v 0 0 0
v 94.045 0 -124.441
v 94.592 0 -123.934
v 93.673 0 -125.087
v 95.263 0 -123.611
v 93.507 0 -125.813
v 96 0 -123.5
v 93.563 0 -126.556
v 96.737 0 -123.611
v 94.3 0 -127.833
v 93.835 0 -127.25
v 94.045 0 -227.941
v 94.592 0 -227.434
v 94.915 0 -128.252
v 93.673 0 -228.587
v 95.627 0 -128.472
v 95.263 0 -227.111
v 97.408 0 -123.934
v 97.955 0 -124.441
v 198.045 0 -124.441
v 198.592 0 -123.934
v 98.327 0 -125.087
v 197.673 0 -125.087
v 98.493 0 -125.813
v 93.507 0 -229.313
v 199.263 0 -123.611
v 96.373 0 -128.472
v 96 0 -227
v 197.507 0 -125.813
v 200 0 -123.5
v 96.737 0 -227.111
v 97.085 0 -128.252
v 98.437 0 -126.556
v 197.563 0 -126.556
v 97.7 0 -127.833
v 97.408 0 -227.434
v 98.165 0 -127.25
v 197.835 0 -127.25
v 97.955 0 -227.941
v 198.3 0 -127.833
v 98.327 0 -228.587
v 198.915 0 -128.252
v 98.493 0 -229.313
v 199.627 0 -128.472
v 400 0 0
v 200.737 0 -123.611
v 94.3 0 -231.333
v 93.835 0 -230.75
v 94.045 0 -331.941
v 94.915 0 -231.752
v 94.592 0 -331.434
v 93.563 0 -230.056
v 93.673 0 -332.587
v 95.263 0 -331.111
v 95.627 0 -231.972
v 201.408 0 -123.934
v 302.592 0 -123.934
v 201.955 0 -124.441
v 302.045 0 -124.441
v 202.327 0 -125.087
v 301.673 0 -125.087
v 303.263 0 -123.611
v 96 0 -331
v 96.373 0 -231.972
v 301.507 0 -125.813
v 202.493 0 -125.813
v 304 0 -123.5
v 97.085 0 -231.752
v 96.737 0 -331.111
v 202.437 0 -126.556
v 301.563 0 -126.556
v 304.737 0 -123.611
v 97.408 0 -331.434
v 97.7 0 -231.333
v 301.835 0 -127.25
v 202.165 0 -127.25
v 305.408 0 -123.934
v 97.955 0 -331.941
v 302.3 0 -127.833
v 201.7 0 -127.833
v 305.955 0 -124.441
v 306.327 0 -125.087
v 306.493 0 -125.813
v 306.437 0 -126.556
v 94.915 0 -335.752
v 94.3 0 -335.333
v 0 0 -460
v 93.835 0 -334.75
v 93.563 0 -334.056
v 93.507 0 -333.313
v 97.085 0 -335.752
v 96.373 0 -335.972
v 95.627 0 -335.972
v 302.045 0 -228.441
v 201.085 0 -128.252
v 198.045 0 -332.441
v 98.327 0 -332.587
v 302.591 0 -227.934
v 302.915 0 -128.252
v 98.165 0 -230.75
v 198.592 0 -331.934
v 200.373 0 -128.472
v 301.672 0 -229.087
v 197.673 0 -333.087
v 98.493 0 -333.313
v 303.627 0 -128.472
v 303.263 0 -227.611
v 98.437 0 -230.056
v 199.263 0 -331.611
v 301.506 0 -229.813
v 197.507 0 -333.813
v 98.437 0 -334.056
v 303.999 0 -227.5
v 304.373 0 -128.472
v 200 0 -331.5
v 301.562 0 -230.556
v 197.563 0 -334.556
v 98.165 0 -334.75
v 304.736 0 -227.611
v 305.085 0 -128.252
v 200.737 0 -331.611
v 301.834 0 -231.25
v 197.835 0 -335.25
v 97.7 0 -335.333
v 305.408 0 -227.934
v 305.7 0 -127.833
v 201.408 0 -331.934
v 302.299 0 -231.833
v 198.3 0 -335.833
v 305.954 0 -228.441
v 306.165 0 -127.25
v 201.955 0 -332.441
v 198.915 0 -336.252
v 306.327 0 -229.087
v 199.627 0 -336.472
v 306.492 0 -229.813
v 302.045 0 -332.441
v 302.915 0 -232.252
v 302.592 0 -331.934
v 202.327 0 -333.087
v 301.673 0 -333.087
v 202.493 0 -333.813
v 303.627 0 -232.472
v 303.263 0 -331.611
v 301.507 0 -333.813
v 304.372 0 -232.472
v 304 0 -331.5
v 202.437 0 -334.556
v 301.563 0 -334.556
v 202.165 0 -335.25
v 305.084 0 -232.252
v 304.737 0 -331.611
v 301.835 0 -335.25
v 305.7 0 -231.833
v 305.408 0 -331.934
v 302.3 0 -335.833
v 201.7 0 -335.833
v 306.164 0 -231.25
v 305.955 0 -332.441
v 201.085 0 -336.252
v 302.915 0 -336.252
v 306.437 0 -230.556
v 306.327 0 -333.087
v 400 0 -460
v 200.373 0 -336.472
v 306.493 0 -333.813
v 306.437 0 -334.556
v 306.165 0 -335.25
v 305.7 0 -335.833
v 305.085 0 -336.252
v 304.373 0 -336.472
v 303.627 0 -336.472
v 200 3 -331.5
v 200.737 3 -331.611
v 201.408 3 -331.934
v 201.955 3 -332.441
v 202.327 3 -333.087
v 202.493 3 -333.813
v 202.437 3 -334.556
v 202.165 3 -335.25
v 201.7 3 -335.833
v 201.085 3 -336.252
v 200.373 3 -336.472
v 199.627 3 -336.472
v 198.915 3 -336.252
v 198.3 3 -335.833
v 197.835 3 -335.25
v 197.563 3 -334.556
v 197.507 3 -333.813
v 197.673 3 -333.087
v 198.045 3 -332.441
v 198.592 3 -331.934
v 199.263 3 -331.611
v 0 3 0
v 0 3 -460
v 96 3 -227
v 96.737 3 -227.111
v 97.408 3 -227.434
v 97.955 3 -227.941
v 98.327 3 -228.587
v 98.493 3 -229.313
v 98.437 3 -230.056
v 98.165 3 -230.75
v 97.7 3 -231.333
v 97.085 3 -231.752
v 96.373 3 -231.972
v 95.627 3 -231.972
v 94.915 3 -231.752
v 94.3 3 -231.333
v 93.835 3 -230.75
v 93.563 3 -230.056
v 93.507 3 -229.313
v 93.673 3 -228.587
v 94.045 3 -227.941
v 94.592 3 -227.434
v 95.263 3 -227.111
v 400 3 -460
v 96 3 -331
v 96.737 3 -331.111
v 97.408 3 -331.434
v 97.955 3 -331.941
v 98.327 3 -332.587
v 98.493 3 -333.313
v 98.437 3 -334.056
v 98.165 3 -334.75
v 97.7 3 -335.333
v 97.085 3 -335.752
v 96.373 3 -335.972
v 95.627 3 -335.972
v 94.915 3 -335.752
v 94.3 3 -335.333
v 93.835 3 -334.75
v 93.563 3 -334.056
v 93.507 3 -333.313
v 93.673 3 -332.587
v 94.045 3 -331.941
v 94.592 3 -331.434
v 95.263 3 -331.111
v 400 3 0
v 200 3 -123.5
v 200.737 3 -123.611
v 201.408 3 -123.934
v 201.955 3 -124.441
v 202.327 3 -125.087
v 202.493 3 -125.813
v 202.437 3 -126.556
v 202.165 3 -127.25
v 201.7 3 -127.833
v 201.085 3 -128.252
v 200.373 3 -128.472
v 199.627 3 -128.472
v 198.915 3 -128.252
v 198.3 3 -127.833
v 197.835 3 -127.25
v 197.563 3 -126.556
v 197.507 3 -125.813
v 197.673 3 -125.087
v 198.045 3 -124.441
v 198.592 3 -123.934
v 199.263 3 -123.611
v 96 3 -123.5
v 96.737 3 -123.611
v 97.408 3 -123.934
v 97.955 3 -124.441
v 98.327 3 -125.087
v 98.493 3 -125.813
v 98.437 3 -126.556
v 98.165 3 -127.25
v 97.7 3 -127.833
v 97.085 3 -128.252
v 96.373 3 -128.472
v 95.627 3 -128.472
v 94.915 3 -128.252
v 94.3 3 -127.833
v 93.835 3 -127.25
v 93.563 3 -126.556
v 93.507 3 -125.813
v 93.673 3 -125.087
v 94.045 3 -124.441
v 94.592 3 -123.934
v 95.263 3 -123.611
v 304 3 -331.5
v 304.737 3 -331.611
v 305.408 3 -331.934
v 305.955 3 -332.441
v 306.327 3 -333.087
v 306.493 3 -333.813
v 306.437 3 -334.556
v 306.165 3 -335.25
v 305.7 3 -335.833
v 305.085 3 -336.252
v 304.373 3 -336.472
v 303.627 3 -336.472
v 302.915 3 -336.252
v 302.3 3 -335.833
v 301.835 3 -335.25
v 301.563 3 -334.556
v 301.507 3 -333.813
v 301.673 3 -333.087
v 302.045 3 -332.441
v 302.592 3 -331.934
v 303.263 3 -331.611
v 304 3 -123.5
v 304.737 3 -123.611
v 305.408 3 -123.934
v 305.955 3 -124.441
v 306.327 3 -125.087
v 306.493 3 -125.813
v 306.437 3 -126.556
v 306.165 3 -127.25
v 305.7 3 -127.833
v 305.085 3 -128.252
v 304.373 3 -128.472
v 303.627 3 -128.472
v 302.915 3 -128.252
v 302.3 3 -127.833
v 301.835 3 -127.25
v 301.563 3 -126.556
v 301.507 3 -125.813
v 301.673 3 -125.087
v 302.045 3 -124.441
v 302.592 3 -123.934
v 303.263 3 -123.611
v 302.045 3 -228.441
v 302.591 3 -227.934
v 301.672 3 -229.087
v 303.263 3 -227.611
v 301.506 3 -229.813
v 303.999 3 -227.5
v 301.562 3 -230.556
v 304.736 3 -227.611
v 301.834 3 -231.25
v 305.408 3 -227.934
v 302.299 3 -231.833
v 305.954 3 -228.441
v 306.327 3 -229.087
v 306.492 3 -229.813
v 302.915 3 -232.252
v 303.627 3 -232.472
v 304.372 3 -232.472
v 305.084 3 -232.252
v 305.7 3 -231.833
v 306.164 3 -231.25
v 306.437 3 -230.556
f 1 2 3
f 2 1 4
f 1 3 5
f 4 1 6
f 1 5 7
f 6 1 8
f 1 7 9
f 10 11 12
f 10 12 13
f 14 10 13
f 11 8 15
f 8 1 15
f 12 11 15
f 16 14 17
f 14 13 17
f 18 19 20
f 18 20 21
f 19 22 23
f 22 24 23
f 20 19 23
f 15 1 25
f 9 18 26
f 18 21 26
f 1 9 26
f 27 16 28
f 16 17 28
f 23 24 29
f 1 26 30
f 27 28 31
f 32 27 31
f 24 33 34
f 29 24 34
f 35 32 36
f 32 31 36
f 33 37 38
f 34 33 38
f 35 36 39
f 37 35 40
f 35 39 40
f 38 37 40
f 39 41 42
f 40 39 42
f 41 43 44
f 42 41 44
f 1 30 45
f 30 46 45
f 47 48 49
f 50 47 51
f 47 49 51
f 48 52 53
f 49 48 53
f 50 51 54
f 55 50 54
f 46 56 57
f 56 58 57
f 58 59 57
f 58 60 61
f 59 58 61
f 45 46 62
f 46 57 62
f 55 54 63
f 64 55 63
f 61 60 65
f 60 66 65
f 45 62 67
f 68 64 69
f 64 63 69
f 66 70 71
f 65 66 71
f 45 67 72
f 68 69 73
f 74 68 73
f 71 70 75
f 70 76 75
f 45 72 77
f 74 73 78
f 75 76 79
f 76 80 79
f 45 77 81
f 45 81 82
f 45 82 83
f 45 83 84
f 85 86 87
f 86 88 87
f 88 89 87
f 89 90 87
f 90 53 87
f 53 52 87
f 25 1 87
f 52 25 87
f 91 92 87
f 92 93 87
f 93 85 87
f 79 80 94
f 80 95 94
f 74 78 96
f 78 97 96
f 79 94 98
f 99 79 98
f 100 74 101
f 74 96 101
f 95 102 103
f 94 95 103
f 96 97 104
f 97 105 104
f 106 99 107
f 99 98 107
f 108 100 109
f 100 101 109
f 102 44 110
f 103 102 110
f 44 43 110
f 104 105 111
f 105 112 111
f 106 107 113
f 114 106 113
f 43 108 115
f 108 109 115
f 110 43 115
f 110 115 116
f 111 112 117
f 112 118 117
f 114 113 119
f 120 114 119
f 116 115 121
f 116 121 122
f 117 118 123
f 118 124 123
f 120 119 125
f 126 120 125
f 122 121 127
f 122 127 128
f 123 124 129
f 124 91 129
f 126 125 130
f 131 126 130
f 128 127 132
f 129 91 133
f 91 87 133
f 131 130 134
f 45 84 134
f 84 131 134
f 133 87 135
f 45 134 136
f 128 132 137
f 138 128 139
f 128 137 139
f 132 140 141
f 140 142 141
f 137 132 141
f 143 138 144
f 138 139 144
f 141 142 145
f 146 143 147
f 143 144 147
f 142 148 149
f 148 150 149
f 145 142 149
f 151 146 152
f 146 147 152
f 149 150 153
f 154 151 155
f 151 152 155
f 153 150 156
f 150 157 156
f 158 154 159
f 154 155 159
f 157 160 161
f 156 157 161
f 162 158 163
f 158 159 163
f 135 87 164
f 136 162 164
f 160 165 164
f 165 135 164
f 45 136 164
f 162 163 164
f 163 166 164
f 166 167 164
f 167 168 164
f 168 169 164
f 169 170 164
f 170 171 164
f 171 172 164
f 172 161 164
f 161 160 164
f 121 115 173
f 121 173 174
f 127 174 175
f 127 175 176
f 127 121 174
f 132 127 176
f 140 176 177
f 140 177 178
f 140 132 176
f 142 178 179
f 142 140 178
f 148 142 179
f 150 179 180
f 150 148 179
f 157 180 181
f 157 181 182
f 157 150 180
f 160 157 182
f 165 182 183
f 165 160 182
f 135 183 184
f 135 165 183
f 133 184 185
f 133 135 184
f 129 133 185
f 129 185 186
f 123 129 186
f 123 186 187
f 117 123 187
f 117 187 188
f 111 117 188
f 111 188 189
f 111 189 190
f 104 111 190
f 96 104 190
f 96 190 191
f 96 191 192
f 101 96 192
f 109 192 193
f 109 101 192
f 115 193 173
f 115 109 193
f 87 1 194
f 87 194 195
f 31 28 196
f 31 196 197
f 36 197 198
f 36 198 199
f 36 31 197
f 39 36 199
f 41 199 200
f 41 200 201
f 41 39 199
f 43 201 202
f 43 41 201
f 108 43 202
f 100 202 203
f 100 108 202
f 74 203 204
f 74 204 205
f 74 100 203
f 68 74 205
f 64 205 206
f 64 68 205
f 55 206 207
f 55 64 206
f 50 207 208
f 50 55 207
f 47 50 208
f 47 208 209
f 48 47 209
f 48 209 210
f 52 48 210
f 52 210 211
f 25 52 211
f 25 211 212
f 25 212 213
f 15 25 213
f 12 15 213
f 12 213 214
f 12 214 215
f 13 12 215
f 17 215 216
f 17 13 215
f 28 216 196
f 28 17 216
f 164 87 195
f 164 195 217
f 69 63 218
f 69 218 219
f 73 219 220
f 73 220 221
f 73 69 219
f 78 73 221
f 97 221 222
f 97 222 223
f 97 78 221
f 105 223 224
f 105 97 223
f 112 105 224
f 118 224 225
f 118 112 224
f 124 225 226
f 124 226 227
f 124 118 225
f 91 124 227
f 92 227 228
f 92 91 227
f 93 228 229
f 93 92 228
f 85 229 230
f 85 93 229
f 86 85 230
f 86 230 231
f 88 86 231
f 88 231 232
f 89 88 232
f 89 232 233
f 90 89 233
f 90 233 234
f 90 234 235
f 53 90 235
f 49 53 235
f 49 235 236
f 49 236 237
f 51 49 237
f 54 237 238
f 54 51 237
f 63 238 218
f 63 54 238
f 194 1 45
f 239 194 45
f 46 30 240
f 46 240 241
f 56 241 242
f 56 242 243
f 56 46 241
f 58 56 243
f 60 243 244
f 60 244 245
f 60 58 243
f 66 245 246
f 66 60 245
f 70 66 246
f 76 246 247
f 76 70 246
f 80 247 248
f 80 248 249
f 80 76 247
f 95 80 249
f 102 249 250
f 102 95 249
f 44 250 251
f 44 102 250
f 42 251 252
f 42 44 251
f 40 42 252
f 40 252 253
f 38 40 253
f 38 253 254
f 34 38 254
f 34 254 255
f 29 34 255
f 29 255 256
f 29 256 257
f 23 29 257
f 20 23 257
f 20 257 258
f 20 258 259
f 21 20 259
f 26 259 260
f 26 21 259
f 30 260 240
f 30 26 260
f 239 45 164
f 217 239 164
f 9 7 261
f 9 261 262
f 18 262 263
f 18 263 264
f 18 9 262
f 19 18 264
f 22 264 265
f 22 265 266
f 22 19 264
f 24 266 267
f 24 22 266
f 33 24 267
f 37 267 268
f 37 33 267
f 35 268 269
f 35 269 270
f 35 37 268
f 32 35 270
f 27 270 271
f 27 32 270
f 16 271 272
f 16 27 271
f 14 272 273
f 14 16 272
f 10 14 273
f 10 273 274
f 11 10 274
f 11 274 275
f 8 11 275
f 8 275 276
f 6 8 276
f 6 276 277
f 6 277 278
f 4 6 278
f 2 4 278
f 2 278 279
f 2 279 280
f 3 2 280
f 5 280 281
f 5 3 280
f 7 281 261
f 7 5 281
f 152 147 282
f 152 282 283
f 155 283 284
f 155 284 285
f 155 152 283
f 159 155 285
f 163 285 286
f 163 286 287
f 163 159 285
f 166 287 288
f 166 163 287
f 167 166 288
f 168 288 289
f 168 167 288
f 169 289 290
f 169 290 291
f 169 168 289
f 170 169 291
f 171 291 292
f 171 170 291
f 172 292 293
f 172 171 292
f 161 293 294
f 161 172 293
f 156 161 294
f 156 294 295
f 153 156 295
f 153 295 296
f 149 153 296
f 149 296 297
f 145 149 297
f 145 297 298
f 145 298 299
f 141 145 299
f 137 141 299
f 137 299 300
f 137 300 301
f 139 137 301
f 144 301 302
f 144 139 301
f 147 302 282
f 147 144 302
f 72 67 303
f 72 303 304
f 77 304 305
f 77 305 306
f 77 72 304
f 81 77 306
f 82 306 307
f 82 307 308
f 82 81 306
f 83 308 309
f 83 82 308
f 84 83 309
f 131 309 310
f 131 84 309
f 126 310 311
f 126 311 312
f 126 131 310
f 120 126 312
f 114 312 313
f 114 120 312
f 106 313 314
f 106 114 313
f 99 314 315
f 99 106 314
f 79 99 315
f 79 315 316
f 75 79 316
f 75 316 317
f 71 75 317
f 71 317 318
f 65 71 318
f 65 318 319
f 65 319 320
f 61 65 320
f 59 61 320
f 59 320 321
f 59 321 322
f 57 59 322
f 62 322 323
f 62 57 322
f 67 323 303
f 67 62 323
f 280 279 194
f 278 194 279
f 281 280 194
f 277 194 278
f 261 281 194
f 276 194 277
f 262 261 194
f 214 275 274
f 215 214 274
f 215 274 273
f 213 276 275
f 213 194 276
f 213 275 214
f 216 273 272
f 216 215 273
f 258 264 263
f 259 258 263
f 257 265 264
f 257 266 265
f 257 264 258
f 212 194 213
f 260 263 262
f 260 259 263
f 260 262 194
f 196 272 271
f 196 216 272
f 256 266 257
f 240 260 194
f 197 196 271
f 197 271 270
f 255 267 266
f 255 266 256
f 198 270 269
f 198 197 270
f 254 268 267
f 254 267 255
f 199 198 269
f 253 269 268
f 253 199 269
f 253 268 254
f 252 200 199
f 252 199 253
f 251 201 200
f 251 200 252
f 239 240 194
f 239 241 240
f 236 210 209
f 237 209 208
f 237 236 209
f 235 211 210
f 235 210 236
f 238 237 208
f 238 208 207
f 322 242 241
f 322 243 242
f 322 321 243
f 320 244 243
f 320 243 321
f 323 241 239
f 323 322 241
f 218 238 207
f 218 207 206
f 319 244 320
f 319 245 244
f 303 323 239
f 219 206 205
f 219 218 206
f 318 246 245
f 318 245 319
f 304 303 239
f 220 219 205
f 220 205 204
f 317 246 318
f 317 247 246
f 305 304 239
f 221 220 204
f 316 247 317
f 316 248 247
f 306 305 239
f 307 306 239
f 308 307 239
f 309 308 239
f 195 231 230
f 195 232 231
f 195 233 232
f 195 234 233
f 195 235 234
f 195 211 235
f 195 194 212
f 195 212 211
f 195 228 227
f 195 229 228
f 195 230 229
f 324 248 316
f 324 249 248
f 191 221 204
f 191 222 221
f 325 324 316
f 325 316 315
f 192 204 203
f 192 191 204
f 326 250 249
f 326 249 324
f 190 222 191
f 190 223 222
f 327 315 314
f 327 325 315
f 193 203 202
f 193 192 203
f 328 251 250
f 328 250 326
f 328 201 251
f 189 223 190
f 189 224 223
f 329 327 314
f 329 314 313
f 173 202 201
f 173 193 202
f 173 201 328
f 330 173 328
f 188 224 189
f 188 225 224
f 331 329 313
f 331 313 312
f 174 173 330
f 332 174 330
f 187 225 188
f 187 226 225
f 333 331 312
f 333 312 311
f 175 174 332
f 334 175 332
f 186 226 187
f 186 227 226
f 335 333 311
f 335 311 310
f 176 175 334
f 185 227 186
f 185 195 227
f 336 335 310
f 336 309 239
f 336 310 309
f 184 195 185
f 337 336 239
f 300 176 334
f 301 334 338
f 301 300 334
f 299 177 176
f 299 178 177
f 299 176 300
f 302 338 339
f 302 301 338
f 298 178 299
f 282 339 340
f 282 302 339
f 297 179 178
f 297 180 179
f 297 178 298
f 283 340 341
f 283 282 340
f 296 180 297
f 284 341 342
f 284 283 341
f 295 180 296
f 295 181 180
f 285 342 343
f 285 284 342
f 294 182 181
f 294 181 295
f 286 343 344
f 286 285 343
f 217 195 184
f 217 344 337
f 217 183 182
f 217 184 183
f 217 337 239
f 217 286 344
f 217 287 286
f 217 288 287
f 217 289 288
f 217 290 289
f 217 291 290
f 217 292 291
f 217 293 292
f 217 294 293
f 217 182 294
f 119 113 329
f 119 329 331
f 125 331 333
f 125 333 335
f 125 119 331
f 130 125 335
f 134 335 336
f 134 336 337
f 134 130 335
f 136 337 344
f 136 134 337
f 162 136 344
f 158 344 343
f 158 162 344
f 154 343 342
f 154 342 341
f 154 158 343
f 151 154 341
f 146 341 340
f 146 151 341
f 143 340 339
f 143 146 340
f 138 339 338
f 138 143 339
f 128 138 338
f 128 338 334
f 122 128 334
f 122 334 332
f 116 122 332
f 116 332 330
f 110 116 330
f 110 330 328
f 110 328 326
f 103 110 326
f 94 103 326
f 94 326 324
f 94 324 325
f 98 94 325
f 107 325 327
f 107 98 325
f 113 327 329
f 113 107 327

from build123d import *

# Parameters (mm, degrees)
SKETCH1_W           = 400
SKETCH1_H           = 460
SKETCH1_R           = 2.5
BOSS_EXTRUDE1_DEPTH = 3


with BuildPart() as part:
    # Sketch1 → Boss-Extrude1 (new body)
    with BuildSketch(Plane(origin=(0, 0, 0), x_dir=(1, 0, 0), z_dir=(0, 1, 0))):
        with Locations((200, 230)):
            Rectangle(SKETCH1_W, SKETCH1_H)
        with Locations(Location((96, 126, 0), (0, 0, 270))):
            Circle(SKETCH1_R, mode=Mode.SUBTRACT)
        with Locations(Location((96, 333.5, 0), (0, 0, 270))):
            Circle(SKETCH1_R, mode=Mode.SUBTRACT)
        with Locations(Location((304, 334, 0), (0, 0, 270))):
            Circle(SKETCH1_R, mode=Mode.SUBTRACT)
        with Locations(Location((304, 126, 0), (0, 0, 270))):
            Circle(SKETCH1_R, mode=Mode.SUBTRACT)
        with Locations(Location((200, 126, 0), (0, 0, 270))):
            Circle(SKETCH1_R, mode=Mode.SUBTRACT)
        with Locations(Location((200, 334, 0), (0, 0, 270))):
            Circle(SKETCH1_R, mode=Mode.SUBTRACT)
        with Locations(Location((303.999399038, 230.000000002, 0), (0, 0, 270))):
            Circle(SKETCH1_R, mode=Mode.SUBTRACT)
        with Locations(Location((96, 229.5, 0), (0, 0, 270))):
            Circle(SKETCH1_R, mode=Mode.SUBTRACT)
    extrude(amount=BOSS_EXTRUDE1_DEPTH)


solid = part.part
